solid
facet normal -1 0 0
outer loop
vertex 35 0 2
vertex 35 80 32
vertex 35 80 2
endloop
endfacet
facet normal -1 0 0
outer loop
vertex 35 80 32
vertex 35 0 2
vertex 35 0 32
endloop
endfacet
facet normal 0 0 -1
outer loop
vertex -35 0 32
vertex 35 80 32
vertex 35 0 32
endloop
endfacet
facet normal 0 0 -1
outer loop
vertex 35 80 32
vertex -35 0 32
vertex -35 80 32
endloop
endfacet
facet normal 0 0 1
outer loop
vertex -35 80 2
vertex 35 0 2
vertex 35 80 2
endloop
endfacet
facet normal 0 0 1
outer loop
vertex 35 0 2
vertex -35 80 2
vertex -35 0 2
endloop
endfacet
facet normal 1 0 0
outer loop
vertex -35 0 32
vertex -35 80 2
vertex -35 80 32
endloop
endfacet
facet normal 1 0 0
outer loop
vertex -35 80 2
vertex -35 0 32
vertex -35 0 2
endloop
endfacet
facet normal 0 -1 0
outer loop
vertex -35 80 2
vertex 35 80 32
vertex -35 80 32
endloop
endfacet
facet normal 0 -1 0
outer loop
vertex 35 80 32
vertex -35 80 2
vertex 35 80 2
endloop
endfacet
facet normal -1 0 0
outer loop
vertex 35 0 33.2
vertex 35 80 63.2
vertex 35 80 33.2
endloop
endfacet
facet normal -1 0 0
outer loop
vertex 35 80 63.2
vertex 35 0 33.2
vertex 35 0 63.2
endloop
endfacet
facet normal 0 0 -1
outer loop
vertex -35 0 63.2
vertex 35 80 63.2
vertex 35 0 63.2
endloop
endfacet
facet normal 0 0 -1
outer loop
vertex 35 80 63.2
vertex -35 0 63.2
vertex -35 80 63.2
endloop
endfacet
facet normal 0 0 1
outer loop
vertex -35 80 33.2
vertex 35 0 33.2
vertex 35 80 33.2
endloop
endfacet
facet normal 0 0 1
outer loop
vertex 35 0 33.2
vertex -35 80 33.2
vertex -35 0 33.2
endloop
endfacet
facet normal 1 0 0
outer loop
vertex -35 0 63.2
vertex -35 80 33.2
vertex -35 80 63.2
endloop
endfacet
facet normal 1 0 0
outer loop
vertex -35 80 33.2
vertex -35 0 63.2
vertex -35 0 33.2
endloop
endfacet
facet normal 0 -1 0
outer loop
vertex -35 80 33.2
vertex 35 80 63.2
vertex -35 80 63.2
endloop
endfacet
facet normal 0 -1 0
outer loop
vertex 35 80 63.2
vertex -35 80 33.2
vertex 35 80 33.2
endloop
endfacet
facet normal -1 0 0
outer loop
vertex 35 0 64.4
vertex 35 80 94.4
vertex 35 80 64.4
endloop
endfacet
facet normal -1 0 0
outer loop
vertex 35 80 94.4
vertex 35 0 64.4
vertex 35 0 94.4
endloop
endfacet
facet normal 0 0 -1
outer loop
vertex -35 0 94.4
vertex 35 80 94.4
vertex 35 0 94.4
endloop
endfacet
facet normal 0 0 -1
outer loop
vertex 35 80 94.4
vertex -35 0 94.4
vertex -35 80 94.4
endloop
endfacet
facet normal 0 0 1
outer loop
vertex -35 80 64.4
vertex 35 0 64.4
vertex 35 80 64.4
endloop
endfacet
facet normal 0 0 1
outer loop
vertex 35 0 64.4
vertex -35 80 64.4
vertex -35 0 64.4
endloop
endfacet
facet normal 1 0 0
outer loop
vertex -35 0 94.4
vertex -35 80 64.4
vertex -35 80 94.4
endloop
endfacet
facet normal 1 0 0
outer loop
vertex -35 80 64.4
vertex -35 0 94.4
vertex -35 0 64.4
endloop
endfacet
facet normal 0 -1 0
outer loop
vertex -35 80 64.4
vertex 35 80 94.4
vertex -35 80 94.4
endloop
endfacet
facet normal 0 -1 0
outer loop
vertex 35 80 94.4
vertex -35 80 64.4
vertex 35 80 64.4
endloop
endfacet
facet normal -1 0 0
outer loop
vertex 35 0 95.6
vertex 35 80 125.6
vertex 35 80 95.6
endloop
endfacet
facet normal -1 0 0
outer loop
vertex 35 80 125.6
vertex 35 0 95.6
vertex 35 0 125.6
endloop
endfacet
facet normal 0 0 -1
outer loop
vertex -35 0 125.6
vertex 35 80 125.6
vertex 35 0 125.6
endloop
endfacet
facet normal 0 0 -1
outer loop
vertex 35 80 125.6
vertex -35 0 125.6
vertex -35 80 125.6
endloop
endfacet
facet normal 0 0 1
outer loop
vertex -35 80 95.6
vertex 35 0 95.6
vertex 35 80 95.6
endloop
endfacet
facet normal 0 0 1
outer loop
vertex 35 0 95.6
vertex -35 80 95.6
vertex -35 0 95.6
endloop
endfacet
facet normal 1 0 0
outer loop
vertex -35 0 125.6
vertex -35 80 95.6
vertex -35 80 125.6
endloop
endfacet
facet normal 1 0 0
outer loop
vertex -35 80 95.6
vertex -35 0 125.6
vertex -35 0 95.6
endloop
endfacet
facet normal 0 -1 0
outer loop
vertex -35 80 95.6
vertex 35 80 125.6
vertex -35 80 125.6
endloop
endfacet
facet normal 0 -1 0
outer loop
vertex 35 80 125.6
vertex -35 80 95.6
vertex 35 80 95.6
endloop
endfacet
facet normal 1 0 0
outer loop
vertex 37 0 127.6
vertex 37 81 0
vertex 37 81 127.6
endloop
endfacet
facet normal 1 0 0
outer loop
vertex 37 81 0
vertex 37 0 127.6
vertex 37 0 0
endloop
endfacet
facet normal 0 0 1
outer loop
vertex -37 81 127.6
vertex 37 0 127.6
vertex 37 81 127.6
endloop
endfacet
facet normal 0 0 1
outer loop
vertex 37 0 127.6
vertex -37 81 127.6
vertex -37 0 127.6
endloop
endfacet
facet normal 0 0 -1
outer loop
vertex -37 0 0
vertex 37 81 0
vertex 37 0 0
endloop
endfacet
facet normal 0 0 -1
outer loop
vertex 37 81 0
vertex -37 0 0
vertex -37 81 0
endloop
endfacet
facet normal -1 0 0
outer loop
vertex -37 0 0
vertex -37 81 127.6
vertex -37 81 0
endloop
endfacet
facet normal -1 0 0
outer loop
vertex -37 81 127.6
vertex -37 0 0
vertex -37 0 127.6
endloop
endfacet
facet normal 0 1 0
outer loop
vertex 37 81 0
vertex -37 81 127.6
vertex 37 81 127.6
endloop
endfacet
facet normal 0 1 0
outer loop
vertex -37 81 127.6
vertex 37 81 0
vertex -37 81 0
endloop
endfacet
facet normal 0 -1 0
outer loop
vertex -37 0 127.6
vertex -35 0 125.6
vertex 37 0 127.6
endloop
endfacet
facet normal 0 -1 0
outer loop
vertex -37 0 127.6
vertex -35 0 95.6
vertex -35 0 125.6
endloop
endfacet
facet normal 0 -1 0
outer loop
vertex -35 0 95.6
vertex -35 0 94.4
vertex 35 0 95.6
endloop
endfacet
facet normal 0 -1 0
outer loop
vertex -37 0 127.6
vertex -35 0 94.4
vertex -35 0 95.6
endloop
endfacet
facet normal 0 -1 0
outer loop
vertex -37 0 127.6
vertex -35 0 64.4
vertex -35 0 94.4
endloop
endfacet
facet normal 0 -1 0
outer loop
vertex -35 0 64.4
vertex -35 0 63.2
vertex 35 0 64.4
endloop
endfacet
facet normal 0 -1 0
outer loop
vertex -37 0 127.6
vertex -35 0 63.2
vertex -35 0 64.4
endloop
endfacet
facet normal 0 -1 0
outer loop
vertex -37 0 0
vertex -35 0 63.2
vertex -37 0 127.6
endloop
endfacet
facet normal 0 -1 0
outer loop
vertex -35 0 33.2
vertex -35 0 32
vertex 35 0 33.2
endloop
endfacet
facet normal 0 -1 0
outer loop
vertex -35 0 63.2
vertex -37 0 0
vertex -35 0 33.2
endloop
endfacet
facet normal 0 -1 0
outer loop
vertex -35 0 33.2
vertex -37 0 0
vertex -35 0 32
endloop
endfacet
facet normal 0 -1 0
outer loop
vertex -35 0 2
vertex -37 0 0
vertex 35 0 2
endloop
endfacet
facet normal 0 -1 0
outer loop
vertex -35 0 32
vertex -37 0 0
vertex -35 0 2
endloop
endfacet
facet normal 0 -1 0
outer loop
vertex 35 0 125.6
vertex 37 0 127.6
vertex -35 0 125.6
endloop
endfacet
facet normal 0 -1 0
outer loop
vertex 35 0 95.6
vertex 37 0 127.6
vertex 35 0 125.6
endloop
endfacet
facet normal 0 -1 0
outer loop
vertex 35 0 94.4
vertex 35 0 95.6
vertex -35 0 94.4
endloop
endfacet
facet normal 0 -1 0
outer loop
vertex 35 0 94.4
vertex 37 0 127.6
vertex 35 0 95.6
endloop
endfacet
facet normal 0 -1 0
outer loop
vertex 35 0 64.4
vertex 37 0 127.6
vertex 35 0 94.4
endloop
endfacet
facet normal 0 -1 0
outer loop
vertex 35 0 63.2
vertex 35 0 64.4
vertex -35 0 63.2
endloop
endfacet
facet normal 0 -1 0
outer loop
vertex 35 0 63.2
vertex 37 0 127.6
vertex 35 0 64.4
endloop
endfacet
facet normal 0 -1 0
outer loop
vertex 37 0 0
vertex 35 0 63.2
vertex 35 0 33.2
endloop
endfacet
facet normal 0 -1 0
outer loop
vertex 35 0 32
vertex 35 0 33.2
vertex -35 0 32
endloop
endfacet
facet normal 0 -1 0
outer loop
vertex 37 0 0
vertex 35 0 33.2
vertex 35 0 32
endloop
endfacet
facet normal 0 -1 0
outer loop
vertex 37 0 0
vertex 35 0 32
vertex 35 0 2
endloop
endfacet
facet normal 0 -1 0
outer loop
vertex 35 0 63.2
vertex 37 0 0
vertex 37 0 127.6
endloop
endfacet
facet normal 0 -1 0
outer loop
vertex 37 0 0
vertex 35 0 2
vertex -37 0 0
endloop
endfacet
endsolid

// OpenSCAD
basic_drawer_width = 70;
basic_drawer_depth = 80;
basic_drawer_walls_height = 25;
basic_drawer_full_height = 30;

shelf_outer_wall_thickness = 2;
shelf_inner_wall_thickness = 1.2;
shelf_back_wall_thickness = 1;

shelf_slot_width = basic_drawer_width;
basic_shelf_width = shelf_slot_width + shelf_outer_wall_thickness * 2;
shelf_depth = basic_drawer_depth + shelf_back_wall_thickness;
shelf_height = basic_drawer_full_height * 4 + shelf_outer_wall_thickness * 2 + shelf_inner_wall_thickness * 3;

difference() {
    translate(v = [ -basic_shelf_width / 2, 0, 0 ])
        cube(size = [ basic_shelf_width, shelf_depth, shelf_height ]);
    for (i = [0:3]) {
        translate(v = [ -shelf_slot_width / 2, -10, shelf_outer_wall_thickness + i * (basic_drawer_full_height + shelf_inner_wall_thickness) ])
            cube(size = [ shelf_slot_width, basic_drawer_depth + 10, basic_drawer_full_height ]);
    }
}
